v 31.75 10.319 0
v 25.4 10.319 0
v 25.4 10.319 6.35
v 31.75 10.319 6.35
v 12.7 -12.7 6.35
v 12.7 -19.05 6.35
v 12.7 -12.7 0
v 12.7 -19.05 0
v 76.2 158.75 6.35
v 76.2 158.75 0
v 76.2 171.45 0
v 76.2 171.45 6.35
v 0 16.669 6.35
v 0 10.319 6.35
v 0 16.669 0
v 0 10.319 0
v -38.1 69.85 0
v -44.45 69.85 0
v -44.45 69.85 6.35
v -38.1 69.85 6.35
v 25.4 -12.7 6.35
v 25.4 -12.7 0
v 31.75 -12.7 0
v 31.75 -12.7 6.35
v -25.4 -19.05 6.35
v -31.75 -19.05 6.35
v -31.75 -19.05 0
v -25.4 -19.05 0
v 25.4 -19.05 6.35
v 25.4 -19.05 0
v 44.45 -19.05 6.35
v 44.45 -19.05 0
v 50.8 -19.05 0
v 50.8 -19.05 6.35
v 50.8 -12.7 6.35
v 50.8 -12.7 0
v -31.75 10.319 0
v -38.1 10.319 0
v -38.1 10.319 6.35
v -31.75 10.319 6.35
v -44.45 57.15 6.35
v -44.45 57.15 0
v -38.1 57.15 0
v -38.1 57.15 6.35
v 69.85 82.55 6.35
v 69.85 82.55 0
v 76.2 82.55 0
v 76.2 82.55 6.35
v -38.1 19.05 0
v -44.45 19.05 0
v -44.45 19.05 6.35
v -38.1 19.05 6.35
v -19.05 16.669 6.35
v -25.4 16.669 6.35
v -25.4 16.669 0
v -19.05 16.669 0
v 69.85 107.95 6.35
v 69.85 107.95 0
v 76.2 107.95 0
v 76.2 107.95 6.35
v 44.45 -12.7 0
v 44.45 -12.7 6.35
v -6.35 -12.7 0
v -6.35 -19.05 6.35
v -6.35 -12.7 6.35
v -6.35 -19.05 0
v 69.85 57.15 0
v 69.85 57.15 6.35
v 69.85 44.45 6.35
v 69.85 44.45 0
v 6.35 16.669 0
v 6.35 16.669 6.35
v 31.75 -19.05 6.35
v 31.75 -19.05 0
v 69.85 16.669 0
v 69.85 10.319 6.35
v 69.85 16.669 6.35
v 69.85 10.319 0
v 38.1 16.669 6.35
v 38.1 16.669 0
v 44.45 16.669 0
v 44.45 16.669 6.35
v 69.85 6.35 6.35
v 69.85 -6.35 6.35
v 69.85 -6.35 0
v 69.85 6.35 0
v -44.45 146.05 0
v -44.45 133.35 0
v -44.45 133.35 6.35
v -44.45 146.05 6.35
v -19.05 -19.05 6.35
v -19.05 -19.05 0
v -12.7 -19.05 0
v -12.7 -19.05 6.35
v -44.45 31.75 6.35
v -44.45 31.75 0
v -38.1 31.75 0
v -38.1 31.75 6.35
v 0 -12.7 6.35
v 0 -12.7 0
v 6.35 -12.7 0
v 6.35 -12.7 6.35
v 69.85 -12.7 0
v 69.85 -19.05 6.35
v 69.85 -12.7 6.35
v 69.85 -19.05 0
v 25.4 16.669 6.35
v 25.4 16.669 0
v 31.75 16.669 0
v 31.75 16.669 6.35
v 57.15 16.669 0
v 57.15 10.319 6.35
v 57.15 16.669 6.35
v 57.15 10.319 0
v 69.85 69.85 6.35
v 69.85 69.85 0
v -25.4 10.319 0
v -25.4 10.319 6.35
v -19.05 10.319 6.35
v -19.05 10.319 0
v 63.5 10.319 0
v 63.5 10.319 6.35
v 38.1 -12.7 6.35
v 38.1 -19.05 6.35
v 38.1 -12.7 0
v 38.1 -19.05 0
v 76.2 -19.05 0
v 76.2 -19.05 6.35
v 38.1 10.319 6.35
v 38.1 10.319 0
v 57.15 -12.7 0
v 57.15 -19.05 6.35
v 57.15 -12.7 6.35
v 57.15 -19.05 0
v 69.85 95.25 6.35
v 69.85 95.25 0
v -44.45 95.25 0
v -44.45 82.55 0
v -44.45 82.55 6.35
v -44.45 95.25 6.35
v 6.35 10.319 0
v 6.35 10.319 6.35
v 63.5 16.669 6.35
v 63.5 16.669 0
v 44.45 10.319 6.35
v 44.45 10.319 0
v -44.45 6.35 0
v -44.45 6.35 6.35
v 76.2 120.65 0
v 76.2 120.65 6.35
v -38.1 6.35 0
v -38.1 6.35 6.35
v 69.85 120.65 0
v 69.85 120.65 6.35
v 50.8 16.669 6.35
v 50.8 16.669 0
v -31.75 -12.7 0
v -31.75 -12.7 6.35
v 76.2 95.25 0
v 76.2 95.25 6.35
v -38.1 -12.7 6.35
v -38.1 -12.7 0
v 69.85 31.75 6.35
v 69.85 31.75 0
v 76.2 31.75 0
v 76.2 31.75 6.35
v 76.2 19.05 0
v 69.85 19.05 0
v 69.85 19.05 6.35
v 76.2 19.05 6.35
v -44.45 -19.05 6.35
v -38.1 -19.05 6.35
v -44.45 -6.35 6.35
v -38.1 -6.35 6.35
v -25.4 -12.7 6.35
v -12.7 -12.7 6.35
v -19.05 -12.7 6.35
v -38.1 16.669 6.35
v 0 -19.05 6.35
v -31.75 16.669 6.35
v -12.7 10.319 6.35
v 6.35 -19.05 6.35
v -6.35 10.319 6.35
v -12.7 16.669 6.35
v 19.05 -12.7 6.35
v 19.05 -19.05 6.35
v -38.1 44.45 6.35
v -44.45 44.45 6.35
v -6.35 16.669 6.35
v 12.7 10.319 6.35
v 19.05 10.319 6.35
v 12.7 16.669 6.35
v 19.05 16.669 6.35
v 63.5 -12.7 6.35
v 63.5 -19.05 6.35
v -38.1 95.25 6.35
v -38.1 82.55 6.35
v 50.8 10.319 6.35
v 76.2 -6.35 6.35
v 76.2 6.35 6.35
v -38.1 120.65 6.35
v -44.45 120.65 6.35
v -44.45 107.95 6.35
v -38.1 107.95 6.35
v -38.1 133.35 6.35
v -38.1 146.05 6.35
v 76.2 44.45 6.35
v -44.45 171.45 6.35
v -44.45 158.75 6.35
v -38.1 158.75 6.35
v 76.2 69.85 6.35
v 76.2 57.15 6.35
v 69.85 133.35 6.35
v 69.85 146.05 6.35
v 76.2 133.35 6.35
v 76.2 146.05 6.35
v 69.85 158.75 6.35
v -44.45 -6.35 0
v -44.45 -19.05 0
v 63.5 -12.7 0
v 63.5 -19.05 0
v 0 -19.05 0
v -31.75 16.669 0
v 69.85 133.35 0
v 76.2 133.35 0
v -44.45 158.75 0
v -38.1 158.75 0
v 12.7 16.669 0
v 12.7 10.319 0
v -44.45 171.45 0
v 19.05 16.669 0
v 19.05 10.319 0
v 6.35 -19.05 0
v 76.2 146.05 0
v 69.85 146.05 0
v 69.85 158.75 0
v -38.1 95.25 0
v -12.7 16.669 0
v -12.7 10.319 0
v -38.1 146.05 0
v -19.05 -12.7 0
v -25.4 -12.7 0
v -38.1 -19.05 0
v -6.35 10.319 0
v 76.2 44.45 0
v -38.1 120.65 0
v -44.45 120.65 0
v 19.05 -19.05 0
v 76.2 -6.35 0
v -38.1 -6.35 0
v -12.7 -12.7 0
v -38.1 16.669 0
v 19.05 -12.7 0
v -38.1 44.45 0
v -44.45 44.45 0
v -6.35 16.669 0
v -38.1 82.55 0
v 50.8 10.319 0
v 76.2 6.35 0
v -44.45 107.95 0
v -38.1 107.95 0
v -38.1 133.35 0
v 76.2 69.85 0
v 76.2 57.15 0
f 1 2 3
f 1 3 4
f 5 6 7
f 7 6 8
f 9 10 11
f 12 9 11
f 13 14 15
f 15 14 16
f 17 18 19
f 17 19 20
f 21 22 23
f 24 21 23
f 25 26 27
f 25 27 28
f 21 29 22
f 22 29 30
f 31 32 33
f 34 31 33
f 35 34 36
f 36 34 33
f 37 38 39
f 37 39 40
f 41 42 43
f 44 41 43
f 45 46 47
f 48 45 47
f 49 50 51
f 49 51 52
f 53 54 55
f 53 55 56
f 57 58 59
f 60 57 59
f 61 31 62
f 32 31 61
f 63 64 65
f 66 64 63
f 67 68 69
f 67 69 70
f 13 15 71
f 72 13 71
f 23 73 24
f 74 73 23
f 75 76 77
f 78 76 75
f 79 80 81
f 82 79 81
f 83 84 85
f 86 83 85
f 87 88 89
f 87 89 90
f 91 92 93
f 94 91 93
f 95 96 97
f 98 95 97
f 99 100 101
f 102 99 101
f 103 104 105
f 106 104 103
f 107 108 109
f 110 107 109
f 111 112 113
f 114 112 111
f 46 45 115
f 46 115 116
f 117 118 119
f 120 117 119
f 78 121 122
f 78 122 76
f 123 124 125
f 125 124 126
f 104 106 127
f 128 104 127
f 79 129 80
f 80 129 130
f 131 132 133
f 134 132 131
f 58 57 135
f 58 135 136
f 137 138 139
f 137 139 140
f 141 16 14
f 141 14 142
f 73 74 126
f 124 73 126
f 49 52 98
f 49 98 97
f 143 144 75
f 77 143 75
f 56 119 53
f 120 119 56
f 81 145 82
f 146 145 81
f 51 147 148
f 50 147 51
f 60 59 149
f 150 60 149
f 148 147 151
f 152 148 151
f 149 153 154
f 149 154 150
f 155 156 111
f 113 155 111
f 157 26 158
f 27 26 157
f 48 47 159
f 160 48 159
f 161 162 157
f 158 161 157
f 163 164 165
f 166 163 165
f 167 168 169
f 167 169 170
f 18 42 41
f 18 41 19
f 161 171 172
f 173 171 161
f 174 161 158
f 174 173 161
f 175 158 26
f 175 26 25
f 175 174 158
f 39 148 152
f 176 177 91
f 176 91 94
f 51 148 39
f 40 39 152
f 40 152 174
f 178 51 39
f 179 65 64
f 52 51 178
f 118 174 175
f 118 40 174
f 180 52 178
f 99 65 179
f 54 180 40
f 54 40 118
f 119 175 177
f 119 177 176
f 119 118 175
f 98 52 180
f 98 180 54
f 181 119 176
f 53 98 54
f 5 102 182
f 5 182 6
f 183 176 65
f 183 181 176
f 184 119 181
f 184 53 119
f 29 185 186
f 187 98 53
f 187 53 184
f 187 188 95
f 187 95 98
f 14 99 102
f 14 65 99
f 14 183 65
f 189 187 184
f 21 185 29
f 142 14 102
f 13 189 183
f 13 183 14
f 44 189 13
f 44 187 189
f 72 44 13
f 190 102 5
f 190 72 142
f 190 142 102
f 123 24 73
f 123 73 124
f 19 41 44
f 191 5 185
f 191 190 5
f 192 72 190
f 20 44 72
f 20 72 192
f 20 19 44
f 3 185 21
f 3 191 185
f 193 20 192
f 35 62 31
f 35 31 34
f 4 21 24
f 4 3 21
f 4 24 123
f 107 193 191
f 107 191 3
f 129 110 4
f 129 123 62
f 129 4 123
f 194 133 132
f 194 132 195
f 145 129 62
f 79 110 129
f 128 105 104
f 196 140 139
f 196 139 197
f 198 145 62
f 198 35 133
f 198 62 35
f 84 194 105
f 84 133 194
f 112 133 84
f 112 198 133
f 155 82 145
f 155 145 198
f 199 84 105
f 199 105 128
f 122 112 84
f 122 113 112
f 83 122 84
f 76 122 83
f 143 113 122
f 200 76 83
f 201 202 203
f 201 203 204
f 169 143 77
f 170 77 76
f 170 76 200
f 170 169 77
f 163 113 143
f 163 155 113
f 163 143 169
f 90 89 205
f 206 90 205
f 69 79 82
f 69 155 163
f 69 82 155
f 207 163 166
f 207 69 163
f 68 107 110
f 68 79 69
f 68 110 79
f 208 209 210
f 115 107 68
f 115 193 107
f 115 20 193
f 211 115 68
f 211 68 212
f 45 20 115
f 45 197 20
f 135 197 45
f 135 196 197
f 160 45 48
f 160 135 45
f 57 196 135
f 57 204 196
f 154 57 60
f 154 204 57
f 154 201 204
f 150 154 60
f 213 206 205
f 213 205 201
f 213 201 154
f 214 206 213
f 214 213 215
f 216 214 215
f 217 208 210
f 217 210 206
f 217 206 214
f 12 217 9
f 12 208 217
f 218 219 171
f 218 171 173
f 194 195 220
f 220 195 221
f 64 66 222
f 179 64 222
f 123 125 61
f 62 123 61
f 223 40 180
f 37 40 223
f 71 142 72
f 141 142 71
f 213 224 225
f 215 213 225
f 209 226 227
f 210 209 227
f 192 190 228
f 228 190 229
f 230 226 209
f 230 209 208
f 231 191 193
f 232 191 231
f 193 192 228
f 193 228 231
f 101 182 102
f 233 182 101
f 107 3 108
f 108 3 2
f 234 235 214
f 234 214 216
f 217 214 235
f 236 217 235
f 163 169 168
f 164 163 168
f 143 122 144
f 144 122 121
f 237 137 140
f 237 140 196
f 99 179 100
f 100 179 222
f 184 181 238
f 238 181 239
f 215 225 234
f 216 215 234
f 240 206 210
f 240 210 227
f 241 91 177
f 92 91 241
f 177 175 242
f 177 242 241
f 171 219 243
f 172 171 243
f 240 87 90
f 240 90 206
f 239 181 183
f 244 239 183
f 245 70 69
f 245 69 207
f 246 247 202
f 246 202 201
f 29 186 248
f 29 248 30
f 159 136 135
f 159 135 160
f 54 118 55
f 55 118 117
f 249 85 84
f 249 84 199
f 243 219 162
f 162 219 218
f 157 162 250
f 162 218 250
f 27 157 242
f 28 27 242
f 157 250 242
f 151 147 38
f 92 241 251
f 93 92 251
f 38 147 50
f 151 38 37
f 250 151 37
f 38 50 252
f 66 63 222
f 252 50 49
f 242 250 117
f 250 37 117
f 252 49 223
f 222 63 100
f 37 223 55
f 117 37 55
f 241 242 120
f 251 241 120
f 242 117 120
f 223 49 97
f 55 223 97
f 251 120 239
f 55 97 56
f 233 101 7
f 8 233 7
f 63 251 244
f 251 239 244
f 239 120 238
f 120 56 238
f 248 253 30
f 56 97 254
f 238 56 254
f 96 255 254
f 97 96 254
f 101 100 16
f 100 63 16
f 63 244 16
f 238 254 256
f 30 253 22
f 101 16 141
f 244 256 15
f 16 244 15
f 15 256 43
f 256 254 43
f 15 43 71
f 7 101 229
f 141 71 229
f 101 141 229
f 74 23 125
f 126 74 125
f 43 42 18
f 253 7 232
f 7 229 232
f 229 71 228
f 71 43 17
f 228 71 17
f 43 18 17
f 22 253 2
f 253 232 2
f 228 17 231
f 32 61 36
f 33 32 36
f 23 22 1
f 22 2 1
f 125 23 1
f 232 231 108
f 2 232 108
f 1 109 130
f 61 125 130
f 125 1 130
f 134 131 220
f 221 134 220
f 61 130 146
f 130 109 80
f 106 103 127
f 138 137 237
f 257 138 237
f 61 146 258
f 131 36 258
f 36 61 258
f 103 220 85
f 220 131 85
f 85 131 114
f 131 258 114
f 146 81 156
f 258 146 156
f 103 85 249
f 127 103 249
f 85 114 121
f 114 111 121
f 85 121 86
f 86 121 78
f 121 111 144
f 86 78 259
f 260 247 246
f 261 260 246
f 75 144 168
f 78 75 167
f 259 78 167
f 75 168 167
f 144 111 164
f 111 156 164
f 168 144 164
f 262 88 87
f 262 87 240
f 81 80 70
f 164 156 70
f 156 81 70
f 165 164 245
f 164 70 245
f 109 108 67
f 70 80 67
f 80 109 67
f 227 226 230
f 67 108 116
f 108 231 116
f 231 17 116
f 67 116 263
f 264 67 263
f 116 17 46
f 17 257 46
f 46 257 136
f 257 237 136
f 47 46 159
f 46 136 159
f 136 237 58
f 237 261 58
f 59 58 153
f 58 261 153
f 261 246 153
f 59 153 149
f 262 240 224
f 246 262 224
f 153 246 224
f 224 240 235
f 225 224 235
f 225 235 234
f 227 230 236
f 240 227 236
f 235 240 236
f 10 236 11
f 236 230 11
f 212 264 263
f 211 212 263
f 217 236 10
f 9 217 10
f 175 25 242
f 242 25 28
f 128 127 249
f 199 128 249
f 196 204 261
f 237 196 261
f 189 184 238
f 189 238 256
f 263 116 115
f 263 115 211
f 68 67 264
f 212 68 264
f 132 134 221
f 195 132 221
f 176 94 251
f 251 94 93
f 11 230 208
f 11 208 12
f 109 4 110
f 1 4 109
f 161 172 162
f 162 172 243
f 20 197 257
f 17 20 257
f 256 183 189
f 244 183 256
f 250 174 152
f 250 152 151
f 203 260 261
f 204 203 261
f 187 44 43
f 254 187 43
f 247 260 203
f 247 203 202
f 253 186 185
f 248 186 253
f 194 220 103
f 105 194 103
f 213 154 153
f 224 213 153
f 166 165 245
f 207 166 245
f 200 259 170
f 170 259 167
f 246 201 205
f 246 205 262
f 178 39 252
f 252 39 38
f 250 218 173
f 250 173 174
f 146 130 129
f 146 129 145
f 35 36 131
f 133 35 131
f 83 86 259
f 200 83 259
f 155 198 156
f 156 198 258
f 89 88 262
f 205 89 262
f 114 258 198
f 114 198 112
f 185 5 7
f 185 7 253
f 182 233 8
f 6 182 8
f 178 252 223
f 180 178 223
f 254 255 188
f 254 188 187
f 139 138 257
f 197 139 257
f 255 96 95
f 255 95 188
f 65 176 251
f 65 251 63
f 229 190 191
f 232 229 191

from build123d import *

# Parameters (mm, degrees)
SKETCH1_W           = 120.65
SKETCH1_H           = 190.5
BOSS_EXTRUDE1_DEPTH = 6.35
CAVITY1_START       = -19.05
CAVITY1_OUTLINE_W   = 6.35
CAVITY1_OUTLINE_H   = 6.35
CAVITY1_DEPTH       = 6.35
CAVITY1_START_2     = 10.31875
CAVITY1_2_OUTLINE_W = 6.35
CAVITY1_2_OUTLINE_H = 6.35
CAVITY1_2_DEPTH     = 6.35
CAVITY1_START_3     = -6.35
CAVITY1_3_OUTLINE_W = 6.35
CAVITY1_3_OUTLINE_H = 6.35
CAVITY1_3_DEPTH     = 12.7
CAVITY1_START_4     = 19.05
CAVITY1_4_OUTLINE_W = 6.35
CAVITY1_4_OUTLINE_H = 6.35
CAVITY1_4_DEPTH     = 12.7
CAVITY1_START_5     = 44.45
CAVITY1_5_OUTLINE_W = 6.35
CAVITY1_5_OUTLINE_H = 6.35
CAVITY1_5_DEPTH     = 12.7
CAVITY1_START_6     = 69.85
CAVITY1_6_OUTLINE_W = 6.35
CAVITY1_6_OUTLINE_H = 6.35
CAVITY1_6_DEPTH     = 12.7
CAVITY1_START_7     = 95.25
CAVITY1_7_OUTLINE_W = 6.35
CAVITY1_7_OUTLINE_H = 6.35
CAVITY1_7_DEPTH     = 12.7
CAVITY1_START_8     = 120.65
CAVITY1_8_OUTLINE_W = 6.35
CAVITY1_8_OUTLINE_H = 6.35
CAVITY1_8_DEPTH     = 12.7
CAVITY1_START_9     = 146.05
CAVITY1_9_OUTLINE_W = 6.35
CAVITY1_9_OUTLINE_H = 6.35
CAVITY1_9_DEPTH     = 12.7


# Read off the part's stored shape, not the designer's step: Cavity1
with BuildPart() as part:
    # Sketch1 → Boss-Extrude1 (new body)
    with BuildSketch(Plane.XY):
        with Locations((15.875, 76.2)):
            Rectangle(SKETCH1_W, SKETCH1_H)
    extrude(amount=BOSS_EXTRUDE1_DEPTH)

    # Cavity1 outline → Cavity1 (cut)
    with BuildSketch(Plane(origin=(0, 0, 0), x_dir=(1, 0, 0), z_dir=(0, 1, 0)).offset(CAVITY1_START)):
        with Locations((66.675, -3.175)):
            Rectangle(CAVITY1_OUTLINE_W, CAVITY1_OUTLINE_H)
        with Locations((53.975, -3.175)):
            Rectangle(CAVITY1_OUTLINE_W, CAVITY1_OUTLINE_H)
        with Locations((41.275, -3.175)):
            Rectangle(CAVITY1_OUTLINE_W, CAVITY1_OUTLINE_H)
        with Locations((28.575, -3.175)):
            Rectangle(CAVITY1_OUTLINE_W, CAVITY1_OUTLINE_H)
        with Locations((15.875, -3.175)):
            Rectangle(CAVITY1_OUTLINE_W, CAVITY1_OUTLINE_H)
        with Locations((3.175, -3.175)):
            Rectangle(CAVITY1_OUTLINE_W, CAVITY1_OUTLINE_H)
        with Locations((-9.525, -3.175)):
            Rectangle(CAVITY1_OUTLINE_W, CAVITY1_OUTLINE_H)
        with Locations((-22.225, -3.175)):
            Rectangle(CAVITY1_OUTLINE_W, CAVITY1_OUTLINE_H)
        with Locations((-34.925, -3.175)):
            Rectangle(CAVITY1_OUTLINE_W, CAVITY1_OUTLINE_H)
    extrude(amount=CAVITY1_DEPTH, mode=Mode.SUBTRACT)

    # Cavity1 2 outline → Cavity1 2 (cut)
    with BuildSketch(Plane(origin=(0, 0, 0), x_dir=(1, 0, 0), z_dir=(0, 1, 0)).offset(CAVITY1_START_2)):
        with Locations((66.675, -3.175)):
            Rectangle(CAVITY1_2_OUTLINE_W, CAVITY1_2_OUTLINE_H)
        with Locations((53.975, -3.175)):
            Rectangle(CAVITY1_2_OUTLINE_W, CAVITY1_2_OUTLINE_H)
        with Locations((41.275, -3.175)):
            Rectangle(CAVITY1_2_OUTLINE_W, CAVITY1_2_OUTLINE_H)
        with Locations((28.575, -3.175)):
            Rectangle(CAVITY1_2_OUTLINE_W, CAVITY1_2_OUTLINE_H)
        with Locations((15.875, -3.175)):
            Rectangle(CAVITY1_2_OUTLINE_W, CAVITY1_2_OUTLINE_H)
        with Locations((3.175, -3.175)):
            Rectangle(CAVITY1_2_OUTLINE_W, CAVITY1_2_OUTLINE_H)
        with Locations((-9.525, -3.175)):
            Rectangle(CAVITY1_2_OUTLINE_W, CAVITY1_2_OUTLINE_H)
        with Locations((-22.225, -3.175)):
            Rectangle(CAVITY1_2_OUTLINE_W, CAVITY1_2_OUTLINE_H)
        with Locations((-34.925, -3.175)):
            Rectangle(CAVITY1_2_OUTLINE_W, CAVITY1_2_OUTLINE_H)
    extrude(amount=CAVITY1_2_DEPTH, mode=Mode.SUBTRACT)

    # Cavity1 3 outline → Cavity1 3 (cut)
    with BuildSketch(Plane(origin=(0, 0, 0), x_dir=(1, 0, 0), z_dir=(0, 1, 0)).offset(CAVITY1_START_3)):
        with Locations((73.025, -3.175)):
            Rectangle(CAVITY1_3_OUTLINE_W, CAVITY1_3_OUTLINE_H)
        with Locations((-41.275, -3.175)):
            Rectangle(CAVITY1_3_OUTLINE_W, CAVITY1_3_OUTLINE_H)
    extrude(amount=CAVITY1_3_DEPTH, mode=Mode.SUBTRACT)

    # Cavity1 4 outline → Cavity1 4 (cut)
    with BuildSketch(Plane(origin=(0, 0, 0), x_dir=(1, 0, 0), z_dir=(0, 1, 0)).offset(CAVITY1_START_4)):
        with Locations((73.025, -3.175)):
            Rectangle(CAVITY1_4_OUTLINE_W, CAVITY1_4_OUTLINE_H)
        with Locations((-41.275, -3.175)):
            Rectangle(CAVITY1_4_OUTLINE_W, CAVITY1_4_OUTLINE_H)
    extrude(amount=CAVITY1_4_DEPTH, mode=Mode.SUBTRACT)

    # Cavity1 5 outline → Cavity1 5 (cut)
    with BuildSketch(Plane(origin=(0, 0, 0), x_dir=(1, 0, 0), z_dir=(0, 1, 0)).offset(CAVITY1_START_5)):
        with Locations((73.025, -3.175)):
            Rectangle(CAVITY1_5_OUTLINE_W, CAVITY1_5_OUTLINE_H)
        with Locations((-41.275, -3.175)):
            Rectangle(CAVITY1_5_OUTLINE_W, CAVITY1_5_OUTLINE_H)
    extrude(amount=CAVITY1_5_DEPTH, mode=Mode.SUBTRACT)

    # Cavity1 6 outline → Cavity1 6 (cut)
    with BuildSketch(Plane(origin=(0, 0, 0), x_dir=(1, 0, 0), z_dir=(0, 1, 0)).offset(CAVITY1_START_6)):
        with Locations((73.025, -3.175)):
            Rectangle(CAVITY1_6_OUTLINE_W, CAVITY1_6_OUTLINE_H)
        with Locations((-41.275, -3.175)):
            Rectangle(CAVITY1_6_OUTLINE_W, CAVITY1_6_OUTLINE_H)
    extrude(amount=CAVITY1_6_DEPTH, mode=Mode.SUBTRACT)

    # Cavity1 7 outline → Cavity1 7 (cut)
    with BuildSketch(Plane(origin=(0, 0, 0), x_dir=(1, 0, 0), z_dir=(0, 1, 0)).offset(CAVITY1_START_7)):
        with Locations((73.025, -3.175)):
            Rectangle(CAVITY1_7_OUTLINE_W, CAVITY1_7_OUTLINE_H)
        with Locations((-41.275, -3.175)):
            Rectangle(CAVITY1_7_OUTLINE_W, CAVITY1_7_OUTLINE_H)
    extrude(amount=CAVITY1_7_DEPTH, mode=Mode.SUBTRACT)

    # Cavity1 8 outline → Cavity1 8 (cut)
    with BuildSketch(Plane(origin=(0, 0, 0), x_dir=(1, 0, 0), z_dir=(0, 1, 0)).offset(CAVITY1_START_8)):
        with Locations((73.025, -3.175)):
            Rectangle(CAVITY1_8_OUTLINE_W, CAVITY1_8_OUTLINE_H)
        with Locations((-41.275, -3.175)):
            Rectangle(CAVITY1_8_OUTLINE_W, CAVITY1_8_OUTLINE_H)
    extrude(amount=CAVITY1_8_DEPTH, mode=Mode.SUBTRACT)

    # Cavity1 9 outline → Cavity1 9 (cut)
    with BuildSketch(Plane(origin=(0, 0, 0), x_dir=(1, 0, 0), z_dir=(0, 1, 0)).offset(CAVITY1_START_9)):
        with Locations((73.025, -3.175)):
            Rectangle(CAVITY1_9_OUTLINE_W, CAVITY1_9_OUTLINE_H)
        with Locations((-41.275, -3.175)):
            Rectangle(CAVITY1_9_OUTLINE_W, CAVITY1_9_OUTLINE_H)
    extrude(amount=CAVITY1_9_DEPTH, mode=Mode.SUBTRACT)


solid = part.part
